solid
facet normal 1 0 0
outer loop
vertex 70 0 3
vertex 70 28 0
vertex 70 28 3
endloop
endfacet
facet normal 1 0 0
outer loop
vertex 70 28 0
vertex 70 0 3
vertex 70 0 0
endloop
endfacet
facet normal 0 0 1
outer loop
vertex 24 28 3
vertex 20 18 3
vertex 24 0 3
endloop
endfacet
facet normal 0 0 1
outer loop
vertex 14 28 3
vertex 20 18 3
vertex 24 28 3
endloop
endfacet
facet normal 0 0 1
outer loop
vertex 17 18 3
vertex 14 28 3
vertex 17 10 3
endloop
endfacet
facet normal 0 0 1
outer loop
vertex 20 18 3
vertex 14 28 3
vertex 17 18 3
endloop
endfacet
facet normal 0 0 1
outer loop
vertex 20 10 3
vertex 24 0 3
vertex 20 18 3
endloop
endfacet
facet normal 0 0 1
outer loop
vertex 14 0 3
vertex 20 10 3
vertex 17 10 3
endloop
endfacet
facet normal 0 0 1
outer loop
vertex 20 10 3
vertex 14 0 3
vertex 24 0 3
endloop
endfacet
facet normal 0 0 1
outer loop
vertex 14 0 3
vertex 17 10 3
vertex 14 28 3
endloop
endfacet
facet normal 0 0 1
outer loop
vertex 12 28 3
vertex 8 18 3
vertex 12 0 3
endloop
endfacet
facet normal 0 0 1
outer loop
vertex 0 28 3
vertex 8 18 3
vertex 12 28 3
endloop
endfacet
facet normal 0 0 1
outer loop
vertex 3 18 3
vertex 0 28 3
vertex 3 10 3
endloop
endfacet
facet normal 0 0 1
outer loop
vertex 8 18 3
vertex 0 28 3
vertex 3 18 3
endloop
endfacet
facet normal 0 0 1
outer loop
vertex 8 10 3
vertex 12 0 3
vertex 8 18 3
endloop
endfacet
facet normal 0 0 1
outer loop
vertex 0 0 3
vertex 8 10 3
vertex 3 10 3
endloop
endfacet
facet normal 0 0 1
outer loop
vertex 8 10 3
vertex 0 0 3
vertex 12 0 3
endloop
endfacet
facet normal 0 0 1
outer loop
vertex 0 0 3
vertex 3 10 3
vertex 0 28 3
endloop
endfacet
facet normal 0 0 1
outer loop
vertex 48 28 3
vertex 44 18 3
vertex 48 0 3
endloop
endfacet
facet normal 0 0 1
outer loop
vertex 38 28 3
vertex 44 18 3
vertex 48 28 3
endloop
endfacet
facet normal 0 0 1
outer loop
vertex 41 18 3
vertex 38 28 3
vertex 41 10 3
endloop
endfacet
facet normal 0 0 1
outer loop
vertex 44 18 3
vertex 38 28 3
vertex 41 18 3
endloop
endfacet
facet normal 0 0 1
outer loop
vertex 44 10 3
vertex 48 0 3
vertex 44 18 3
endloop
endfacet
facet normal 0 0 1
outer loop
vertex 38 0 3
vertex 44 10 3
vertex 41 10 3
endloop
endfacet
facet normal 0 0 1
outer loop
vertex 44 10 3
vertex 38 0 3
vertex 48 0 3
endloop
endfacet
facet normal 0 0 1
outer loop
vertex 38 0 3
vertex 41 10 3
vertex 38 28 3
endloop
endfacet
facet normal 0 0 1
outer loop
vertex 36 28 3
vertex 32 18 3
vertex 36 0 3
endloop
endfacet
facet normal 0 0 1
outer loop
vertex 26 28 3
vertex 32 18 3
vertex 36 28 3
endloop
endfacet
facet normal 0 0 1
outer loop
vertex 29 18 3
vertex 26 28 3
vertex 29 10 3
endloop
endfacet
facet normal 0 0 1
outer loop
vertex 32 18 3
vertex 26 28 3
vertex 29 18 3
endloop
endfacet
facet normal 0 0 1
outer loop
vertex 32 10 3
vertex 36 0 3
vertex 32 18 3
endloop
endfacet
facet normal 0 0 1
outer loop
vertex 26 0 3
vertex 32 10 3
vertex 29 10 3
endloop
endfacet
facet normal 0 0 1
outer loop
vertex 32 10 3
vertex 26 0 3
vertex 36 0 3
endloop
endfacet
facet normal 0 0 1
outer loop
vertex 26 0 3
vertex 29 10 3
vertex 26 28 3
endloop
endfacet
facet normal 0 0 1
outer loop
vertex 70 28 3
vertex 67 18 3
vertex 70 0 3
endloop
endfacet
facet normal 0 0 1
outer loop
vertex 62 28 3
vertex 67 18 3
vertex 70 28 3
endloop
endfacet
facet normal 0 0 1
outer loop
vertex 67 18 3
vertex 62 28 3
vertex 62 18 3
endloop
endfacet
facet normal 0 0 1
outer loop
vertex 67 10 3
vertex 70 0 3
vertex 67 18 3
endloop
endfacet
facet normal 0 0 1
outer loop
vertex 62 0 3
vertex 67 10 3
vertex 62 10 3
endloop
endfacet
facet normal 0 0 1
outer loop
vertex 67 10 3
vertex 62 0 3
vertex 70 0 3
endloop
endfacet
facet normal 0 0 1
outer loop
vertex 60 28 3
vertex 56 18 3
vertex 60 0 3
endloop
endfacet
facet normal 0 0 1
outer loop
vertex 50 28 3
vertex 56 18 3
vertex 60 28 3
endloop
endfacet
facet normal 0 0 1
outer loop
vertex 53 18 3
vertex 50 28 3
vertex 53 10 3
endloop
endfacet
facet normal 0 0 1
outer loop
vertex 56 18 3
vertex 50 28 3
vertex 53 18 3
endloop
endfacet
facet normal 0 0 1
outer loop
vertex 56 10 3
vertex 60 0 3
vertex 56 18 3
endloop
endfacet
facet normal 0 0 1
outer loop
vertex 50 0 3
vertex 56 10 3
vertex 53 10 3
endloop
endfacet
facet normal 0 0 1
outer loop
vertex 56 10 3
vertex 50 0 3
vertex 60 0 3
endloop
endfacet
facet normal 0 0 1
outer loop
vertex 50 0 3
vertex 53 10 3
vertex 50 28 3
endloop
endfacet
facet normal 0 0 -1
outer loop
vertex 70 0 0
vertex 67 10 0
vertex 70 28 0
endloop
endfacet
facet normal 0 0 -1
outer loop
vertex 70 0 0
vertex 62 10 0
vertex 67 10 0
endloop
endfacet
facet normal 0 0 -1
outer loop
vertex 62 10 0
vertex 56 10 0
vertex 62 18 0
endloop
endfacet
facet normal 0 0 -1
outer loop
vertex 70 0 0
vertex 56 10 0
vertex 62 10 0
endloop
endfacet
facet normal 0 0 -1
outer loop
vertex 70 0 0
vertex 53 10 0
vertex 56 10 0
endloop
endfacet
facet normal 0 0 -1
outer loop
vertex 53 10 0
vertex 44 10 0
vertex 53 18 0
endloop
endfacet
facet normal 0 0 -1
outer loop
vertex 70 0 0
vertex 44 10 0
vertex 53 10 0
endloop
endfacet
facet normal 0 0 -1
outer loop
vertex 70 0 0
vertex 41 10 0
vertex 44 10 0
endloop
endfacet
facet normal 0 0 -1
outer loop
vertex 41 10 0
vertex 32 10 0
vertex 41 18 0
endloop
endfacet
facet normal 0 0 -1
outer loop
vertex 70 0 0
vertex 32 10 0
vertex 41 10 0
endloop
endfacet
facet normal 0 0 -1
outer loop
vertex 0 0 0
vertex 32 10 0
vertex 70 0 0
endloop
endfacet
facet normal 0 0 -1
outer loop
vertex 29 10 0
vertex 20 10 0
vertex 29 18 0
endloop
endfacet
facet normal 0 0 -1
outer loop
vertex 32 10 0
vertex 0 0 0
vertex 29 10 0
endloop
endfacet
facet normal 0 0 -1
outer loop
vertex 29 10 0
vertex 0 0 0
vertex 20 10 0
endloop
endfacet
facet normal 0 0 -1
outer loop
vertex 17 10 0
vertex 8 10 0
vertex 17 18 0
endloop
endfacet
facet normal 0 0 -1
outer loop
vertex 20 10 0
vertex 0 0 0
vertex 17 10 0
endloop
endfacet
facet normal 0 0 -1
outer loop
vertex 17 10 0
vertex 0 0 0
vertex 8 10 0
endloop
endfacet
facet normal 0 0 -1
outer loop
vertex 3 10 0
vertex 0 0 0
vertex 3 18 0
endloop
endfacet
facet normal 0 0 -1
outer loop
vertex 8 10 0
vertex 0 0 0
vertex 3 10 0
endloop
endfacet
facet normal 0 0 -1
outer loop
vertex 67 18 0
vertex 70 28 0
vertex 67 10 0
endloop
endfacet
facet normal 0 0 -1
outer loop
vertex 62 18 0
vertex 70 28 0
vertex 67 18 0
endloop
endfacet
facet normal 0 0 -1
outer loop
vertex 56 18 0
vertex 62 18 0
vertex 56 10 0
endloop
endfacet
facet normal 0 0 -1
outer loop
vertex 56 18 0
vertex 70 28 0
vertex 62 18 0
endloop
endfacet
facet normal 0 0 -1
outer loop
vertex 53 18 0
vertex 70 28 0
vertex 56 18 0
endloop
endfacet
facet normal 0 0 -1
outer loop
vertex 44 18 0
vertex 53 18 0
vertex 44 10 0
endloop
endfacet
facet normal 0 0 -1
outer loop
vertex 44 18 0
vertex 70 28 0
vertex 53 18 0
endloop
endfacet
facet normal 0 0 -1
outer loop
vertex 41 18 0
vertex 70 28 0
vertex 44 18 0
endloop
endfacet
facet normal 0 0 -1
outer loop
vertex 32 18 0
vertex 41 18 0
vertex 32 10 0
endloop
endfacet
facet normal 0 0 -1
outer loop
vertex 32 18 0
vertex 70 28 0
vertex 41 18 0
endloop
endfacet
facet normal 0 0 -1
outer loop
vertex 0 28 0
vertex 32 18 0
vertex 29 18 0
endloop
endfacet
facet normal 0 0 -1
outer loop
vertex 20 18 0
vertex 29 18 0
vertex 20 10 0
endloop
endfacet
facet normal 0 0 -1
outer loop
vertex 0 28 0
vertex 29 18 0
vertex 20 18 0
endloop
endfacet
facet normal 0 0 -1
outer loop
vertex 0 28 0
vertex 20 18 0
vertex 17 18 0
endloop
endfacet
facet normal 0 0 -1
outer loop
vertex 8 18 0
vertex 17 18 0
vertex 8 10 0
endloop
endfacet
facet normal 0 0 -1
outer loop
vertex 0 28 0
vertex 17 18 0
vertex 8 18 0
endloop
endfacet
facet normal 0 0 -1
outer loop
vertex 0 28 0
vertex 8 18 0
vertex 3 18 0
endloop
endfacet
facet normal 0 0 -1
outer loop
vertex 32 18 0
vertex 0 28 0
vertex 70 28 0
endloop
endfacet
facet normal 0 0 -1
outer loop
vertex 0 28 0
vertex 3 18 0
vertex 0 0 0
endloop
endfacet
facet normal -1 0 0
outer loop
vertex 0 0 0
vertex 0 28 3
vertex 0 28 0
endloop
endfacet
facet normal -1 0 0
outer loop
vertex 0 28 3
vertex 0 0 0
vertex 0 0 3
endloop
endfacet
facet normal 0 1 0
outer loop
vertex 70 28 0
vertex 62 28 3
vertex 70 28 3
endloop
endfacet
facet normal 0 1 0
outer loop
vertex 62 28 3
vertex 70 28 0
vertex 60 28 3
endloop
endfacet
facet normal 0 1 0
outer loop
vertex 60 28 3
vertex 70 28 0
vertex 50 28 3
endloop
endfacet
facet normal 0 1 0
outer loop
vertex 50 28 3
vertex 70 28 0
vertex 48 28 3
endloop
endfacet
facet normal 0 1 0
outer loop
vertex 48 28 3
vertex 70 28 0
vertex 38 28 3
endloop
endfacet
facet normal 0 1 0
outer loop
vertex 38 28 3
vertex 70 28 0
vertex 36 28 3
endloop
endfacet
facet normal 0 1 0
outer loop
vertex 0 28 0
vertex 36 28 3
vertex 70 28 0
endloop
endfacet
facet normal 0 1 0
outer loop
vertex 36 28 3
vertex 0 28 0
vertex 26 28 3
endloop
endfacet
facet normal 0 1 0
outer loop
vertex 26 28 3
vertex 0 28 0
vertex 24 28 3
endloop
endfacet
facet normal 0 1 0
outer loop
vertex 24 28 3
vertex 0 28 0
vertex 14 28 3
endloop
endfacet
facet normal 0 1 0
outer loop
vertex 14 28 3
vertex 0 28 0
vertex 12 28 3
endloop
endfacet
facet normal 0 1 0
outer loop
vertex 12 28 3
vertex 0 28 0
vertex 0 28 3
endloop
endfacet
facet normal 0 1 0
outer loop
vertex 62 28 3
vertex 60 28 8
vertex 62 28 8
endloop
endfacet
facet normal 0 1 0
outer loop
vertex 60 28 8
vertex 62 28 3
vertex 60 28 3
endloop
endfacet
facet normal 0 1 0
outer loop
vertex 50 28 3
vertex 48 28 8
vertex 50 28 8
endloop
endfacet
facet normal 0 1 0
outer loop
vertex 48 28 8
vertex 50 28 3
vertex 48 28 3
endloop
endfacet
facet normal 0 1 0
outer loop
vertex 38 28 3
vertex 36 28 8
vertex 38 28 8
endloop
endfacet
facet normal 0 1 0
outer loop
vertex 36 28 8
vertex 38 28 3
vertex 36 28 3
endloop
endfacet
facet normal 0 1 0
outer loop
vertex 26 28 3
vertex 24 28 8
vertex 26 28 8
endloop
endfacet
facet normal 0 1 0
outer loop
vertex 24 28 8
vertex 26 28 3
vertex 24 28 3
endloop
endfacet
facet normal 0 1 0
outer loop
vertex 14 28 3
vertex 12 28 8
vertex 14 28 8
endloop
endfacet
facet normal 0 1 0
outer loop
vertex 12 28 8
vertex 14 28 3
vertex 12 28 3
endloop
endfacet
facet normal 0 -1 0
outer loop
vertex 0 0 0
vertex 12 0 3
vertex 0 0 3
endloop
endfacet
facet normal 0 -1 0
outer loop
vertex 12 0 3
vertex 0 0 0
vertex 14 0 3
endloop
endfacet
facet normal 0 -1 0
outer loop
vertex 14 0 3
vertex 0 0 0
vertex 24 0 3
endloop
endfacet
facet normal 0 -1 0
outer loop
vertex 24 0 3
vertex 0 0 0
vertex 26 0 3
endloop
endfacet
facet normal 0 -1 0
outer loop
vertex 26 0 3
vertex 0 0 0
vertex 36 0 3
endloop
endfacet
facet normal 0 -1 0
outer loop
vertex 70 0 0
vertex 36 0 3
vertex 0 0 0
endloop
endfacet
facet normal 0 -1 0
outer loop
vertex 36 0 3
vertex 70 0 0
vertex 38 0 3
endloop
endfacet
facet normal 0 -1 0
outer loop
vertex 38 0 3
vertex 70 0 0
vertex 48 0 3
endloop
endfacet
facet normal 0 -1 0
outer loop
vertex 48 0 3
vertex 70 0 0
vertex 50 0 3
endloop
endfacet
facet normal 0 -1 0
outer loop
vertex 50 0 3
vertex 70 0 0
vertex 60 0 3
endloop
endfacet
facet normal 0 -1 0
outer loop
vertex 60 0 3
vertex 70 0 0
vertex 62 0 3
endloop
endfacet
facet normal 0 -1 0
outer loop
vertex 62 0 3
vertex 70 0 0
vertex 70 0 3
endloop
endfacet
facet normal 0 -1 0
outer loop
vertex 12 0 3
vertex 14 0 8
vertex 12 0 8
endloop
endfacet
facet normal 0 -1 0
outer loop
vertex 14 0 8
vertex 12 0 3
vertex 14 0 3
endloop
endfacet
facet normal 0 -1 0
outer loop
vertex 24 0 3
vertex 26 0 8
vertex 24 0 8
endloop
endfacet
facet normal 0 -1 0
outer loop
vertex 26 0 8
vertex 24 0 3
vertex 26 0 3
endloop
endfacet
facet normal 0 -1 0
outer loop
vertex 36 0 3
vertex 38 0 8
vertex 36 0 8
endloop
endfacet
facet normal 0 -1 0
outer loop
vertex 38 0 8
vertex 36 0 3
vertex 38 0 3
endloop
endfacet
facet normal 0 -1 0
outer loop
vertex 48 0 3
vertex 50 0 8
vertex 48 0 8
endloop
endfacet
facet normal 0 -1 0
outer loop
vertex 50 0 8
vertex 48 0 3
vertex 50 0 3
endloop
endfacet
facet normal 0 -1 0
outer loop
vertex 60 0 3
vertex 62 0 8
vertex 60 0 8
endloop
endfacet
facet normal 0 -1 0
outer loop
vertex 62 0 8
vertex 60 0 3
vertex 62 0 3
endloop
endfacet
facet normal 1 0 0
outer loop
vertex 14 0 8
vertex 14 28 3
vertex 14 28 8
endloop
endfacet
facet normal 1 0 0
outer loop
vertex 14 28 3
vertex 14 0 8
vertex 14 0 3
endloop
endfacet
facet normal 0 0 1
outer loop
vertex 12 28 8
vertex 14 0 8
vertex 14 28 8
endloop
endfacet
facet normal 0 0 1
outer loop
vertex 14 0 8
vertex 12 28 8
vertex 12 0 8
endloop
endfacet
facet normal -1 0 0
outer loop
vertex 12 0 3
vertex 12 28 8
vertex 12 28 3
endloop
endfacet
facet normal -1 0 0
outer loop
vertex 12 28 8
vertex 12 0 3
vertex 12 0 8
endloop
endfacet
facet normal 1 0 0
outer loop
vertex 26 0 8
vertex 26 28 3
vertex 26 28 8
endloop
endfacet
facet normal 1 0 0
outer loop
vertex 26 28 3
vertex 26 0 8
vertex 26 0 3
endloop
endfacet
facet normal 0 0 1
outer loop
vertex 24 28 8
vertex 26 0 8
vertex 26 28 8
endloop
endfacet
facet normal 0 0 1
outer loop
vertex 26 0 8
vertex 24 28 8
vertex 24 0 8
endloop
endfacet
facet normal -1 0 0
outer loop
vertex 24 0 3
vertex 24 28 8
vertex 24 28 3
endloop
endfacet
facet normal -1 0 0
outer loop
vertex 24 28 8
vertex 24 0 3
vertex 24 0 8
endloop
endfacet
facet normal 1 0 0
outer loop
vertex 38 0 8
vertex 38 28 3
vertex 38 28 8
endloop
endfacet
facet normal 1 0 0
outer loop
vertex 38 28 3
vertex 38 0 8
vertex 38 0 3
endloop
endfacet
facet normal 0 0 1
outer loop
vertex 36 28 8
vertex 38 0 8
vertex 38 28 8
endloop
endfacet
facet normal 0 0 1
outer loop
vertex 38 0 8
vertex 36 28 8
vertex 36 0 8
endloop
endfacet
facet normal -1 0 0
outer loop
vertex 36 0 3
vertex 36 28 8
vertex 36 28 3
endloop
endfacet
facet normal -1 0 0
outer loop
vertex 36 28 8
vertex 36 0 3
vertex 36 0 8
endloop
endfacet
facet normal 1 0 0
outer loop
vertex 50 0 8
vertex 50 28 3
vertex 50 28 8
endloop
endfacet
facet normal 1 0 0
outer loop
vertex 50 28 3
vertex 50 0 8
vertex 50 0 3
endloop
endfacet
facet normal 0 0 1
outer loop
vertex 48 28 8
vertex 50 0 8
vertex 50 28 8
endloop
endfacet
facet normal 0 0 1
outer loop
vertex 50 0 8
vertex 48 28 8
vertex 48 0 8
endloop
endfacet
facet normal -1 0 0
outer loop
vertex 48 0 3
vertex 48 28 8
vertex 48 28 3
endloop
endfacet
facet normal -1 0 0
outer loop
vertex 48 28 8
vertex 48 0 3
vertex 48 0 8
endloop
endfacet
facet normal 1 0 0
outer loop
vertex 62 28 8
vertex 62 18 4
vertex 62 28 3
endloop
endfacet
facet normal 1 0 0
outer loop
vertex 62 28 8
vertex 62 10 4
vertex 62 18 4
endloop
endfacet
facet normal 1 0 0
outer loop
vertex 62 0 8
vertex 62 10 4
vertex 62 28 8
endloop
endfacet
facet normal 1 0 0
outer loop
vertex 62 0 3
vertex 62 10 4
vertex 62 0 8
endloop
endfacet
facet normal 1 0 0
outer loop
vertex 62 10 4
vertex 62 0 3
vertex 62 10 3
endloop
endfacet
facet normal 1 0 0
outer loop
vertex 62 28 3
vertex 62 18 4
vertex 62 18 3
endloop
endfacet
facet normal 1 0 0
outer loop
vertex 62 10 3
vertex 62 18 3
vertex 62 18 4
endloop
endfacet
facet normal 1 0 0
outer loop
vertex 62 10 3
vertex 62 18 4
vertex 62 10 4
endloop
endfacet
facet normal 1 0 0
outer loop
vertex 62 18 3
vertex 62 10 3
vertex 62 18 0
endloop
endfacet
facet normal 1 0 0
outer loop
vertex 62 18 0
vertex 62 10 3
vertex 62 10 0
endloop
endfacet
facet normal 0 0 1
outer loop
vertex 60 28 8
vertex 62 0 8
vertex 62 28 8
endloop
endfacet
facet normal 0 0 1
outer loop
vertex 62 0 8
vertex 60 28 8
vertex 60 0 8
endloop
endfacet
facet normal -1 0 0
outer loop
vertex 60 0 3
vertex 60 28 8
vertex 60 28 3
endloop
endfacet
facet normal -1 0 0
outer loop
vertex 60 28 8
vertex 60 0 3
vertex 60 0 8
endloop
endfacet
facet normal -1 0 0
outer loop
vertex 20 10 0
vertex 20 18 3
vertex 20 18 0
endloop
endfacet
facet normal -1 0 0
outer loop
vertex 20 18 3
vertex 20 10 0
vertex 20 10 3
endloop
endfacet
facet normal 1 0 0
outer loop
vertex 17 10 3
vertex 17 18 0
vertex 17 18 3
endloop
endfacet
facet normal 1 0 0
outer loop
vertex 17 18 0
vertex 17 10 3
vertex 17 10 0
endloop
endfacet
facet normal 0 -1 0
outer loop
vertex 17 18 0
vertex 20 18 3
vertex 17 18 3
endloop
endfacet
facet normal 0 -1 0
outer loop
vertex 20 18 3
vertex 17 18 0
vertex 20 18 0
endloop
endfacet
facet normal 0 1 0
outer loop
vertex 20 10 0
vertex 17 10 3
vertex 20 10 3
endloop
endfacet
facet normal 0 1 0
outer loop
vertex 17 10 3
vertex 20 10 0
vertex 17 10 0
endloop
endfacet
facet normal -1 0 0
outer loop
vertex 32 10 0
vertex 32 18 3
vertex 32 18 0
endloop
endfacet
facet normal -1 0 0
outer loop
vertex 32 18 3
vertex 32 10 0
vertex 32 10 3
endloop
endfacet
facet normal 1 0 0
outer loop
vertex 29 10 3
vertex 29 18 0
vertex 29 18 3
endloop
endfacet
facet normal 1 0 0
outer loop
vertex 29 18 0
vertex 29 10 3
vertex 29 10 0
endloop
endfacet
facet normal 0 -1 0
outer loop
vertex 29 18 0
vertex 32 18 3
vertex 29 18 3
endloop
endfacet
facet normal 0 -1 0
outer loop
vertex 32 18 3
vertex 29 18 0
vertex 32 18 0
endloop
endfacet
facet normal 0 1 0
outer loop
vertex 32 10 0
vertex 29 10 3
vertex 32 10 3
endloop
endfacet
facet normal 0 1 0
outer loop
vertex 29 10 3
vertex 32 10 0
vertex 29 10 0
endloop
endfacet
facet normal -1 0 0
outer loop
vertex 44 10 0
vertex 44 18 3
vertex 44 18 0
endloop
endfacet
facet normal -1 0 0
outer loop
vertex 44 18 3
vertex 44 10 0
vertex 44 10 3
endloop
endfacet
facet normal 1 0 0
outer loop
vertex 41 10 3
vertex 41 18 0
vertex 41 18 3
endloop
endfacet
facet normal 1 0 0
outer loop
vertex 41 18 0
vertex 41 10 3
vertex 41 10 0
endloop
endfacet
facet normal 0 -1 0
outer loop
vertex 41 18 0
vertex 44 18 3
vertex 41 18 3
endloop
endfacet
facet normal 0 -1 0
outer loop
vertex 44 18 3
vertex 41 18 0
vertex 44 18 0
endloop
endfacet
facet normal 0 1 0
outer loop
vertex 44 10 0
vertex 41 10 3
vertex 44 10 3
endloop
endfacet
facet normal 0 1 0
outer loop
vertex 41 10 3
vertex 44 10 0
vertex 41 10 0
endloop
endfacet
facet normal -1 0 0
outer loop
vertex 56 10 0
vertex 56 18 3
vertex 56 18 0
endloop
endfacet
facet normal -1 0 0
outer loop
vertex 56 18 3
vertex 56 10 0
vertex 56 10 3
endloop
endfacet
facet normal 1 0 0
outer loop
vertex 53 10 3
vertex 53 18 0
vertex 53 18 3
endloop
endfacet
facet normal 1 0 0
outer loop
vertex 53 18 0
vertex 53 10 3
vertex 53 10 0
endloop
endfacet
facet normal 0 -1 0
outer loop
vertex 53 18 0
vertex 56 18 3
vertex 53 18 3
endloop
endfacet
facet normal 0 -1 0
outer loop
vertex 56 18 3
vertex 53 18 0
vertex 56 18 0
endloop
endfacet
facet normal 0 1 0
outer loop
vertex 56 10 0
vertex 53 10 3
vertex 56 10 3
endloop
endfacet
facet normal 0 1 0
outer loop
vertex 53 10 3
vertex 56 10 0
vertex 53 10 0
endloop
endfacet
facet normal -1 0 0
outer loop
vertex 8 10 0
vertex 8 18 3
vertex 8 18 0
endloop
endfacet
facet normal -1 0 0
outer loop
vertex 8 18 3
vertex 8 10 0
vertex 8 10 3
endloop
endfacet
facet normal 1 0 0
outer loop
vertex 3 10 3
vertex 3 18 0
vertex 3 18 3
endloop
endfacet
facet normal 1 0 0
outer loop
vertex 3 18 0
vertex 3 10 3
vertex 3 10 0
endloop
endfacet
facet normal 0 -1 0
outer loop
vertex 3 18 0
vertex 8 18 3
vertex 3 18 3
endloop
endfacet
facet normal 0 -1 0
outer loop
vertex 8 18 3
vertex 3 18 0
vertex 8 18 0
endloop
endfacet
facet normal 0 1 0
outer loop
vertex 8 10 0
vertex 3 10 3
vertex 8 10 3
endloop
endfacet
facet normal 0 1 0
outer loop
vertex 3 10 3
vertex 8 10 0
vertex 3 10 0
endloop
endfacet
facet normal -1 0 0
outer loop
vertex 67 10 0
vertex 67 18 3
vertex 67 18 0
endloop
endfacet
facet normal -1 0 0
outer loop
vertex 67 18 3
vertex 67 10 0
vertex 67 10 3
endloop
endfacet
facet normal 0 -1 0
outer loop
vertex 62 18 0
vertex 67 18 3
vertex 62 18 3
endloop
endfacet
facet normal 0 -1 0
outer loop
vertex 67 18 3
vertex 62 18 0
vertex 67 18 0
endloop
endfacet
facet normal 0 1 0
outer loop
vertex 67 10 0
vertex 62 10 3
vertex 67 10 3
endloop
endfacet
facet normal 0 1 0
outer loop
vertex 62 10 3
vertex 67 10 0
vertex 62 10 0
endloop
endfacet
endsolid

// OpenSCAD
// Original MechIntel educational model. CC0-1.0. Units: mm.
// Not a standardized or load-rated component.
$fn=96;
length=70;
width=28;
base=3;
rail_height=5;
$fn=64;
difference(){union(){
translate([0,0,0]) cube([length,width,base]);
translate([12,0,base]) cube([2,width,rail_height]);
translate([24,0,base]) cube([2,width,rail_height]);
translate([36,0,base]) cube([2,width,rail_height]);
translate([48,0,base]) cube([2,width,rail_height]);
translate([60,0,base]) cube([2,width,rail_height]);
}
translate([17,10,-1]) cube([3,8,base+2]);
translate([29,10,-1]) cube([3,8,base+2]);
translate([41,10,-1]) cube([3,8,base+2]);
translate([53,10,-1]) cube([3,8,base+2]);
translate([3,10,-1]) cube([5,8,base+2]);
translate([62,10,-1]) cube([5,8,base+2]);
}
